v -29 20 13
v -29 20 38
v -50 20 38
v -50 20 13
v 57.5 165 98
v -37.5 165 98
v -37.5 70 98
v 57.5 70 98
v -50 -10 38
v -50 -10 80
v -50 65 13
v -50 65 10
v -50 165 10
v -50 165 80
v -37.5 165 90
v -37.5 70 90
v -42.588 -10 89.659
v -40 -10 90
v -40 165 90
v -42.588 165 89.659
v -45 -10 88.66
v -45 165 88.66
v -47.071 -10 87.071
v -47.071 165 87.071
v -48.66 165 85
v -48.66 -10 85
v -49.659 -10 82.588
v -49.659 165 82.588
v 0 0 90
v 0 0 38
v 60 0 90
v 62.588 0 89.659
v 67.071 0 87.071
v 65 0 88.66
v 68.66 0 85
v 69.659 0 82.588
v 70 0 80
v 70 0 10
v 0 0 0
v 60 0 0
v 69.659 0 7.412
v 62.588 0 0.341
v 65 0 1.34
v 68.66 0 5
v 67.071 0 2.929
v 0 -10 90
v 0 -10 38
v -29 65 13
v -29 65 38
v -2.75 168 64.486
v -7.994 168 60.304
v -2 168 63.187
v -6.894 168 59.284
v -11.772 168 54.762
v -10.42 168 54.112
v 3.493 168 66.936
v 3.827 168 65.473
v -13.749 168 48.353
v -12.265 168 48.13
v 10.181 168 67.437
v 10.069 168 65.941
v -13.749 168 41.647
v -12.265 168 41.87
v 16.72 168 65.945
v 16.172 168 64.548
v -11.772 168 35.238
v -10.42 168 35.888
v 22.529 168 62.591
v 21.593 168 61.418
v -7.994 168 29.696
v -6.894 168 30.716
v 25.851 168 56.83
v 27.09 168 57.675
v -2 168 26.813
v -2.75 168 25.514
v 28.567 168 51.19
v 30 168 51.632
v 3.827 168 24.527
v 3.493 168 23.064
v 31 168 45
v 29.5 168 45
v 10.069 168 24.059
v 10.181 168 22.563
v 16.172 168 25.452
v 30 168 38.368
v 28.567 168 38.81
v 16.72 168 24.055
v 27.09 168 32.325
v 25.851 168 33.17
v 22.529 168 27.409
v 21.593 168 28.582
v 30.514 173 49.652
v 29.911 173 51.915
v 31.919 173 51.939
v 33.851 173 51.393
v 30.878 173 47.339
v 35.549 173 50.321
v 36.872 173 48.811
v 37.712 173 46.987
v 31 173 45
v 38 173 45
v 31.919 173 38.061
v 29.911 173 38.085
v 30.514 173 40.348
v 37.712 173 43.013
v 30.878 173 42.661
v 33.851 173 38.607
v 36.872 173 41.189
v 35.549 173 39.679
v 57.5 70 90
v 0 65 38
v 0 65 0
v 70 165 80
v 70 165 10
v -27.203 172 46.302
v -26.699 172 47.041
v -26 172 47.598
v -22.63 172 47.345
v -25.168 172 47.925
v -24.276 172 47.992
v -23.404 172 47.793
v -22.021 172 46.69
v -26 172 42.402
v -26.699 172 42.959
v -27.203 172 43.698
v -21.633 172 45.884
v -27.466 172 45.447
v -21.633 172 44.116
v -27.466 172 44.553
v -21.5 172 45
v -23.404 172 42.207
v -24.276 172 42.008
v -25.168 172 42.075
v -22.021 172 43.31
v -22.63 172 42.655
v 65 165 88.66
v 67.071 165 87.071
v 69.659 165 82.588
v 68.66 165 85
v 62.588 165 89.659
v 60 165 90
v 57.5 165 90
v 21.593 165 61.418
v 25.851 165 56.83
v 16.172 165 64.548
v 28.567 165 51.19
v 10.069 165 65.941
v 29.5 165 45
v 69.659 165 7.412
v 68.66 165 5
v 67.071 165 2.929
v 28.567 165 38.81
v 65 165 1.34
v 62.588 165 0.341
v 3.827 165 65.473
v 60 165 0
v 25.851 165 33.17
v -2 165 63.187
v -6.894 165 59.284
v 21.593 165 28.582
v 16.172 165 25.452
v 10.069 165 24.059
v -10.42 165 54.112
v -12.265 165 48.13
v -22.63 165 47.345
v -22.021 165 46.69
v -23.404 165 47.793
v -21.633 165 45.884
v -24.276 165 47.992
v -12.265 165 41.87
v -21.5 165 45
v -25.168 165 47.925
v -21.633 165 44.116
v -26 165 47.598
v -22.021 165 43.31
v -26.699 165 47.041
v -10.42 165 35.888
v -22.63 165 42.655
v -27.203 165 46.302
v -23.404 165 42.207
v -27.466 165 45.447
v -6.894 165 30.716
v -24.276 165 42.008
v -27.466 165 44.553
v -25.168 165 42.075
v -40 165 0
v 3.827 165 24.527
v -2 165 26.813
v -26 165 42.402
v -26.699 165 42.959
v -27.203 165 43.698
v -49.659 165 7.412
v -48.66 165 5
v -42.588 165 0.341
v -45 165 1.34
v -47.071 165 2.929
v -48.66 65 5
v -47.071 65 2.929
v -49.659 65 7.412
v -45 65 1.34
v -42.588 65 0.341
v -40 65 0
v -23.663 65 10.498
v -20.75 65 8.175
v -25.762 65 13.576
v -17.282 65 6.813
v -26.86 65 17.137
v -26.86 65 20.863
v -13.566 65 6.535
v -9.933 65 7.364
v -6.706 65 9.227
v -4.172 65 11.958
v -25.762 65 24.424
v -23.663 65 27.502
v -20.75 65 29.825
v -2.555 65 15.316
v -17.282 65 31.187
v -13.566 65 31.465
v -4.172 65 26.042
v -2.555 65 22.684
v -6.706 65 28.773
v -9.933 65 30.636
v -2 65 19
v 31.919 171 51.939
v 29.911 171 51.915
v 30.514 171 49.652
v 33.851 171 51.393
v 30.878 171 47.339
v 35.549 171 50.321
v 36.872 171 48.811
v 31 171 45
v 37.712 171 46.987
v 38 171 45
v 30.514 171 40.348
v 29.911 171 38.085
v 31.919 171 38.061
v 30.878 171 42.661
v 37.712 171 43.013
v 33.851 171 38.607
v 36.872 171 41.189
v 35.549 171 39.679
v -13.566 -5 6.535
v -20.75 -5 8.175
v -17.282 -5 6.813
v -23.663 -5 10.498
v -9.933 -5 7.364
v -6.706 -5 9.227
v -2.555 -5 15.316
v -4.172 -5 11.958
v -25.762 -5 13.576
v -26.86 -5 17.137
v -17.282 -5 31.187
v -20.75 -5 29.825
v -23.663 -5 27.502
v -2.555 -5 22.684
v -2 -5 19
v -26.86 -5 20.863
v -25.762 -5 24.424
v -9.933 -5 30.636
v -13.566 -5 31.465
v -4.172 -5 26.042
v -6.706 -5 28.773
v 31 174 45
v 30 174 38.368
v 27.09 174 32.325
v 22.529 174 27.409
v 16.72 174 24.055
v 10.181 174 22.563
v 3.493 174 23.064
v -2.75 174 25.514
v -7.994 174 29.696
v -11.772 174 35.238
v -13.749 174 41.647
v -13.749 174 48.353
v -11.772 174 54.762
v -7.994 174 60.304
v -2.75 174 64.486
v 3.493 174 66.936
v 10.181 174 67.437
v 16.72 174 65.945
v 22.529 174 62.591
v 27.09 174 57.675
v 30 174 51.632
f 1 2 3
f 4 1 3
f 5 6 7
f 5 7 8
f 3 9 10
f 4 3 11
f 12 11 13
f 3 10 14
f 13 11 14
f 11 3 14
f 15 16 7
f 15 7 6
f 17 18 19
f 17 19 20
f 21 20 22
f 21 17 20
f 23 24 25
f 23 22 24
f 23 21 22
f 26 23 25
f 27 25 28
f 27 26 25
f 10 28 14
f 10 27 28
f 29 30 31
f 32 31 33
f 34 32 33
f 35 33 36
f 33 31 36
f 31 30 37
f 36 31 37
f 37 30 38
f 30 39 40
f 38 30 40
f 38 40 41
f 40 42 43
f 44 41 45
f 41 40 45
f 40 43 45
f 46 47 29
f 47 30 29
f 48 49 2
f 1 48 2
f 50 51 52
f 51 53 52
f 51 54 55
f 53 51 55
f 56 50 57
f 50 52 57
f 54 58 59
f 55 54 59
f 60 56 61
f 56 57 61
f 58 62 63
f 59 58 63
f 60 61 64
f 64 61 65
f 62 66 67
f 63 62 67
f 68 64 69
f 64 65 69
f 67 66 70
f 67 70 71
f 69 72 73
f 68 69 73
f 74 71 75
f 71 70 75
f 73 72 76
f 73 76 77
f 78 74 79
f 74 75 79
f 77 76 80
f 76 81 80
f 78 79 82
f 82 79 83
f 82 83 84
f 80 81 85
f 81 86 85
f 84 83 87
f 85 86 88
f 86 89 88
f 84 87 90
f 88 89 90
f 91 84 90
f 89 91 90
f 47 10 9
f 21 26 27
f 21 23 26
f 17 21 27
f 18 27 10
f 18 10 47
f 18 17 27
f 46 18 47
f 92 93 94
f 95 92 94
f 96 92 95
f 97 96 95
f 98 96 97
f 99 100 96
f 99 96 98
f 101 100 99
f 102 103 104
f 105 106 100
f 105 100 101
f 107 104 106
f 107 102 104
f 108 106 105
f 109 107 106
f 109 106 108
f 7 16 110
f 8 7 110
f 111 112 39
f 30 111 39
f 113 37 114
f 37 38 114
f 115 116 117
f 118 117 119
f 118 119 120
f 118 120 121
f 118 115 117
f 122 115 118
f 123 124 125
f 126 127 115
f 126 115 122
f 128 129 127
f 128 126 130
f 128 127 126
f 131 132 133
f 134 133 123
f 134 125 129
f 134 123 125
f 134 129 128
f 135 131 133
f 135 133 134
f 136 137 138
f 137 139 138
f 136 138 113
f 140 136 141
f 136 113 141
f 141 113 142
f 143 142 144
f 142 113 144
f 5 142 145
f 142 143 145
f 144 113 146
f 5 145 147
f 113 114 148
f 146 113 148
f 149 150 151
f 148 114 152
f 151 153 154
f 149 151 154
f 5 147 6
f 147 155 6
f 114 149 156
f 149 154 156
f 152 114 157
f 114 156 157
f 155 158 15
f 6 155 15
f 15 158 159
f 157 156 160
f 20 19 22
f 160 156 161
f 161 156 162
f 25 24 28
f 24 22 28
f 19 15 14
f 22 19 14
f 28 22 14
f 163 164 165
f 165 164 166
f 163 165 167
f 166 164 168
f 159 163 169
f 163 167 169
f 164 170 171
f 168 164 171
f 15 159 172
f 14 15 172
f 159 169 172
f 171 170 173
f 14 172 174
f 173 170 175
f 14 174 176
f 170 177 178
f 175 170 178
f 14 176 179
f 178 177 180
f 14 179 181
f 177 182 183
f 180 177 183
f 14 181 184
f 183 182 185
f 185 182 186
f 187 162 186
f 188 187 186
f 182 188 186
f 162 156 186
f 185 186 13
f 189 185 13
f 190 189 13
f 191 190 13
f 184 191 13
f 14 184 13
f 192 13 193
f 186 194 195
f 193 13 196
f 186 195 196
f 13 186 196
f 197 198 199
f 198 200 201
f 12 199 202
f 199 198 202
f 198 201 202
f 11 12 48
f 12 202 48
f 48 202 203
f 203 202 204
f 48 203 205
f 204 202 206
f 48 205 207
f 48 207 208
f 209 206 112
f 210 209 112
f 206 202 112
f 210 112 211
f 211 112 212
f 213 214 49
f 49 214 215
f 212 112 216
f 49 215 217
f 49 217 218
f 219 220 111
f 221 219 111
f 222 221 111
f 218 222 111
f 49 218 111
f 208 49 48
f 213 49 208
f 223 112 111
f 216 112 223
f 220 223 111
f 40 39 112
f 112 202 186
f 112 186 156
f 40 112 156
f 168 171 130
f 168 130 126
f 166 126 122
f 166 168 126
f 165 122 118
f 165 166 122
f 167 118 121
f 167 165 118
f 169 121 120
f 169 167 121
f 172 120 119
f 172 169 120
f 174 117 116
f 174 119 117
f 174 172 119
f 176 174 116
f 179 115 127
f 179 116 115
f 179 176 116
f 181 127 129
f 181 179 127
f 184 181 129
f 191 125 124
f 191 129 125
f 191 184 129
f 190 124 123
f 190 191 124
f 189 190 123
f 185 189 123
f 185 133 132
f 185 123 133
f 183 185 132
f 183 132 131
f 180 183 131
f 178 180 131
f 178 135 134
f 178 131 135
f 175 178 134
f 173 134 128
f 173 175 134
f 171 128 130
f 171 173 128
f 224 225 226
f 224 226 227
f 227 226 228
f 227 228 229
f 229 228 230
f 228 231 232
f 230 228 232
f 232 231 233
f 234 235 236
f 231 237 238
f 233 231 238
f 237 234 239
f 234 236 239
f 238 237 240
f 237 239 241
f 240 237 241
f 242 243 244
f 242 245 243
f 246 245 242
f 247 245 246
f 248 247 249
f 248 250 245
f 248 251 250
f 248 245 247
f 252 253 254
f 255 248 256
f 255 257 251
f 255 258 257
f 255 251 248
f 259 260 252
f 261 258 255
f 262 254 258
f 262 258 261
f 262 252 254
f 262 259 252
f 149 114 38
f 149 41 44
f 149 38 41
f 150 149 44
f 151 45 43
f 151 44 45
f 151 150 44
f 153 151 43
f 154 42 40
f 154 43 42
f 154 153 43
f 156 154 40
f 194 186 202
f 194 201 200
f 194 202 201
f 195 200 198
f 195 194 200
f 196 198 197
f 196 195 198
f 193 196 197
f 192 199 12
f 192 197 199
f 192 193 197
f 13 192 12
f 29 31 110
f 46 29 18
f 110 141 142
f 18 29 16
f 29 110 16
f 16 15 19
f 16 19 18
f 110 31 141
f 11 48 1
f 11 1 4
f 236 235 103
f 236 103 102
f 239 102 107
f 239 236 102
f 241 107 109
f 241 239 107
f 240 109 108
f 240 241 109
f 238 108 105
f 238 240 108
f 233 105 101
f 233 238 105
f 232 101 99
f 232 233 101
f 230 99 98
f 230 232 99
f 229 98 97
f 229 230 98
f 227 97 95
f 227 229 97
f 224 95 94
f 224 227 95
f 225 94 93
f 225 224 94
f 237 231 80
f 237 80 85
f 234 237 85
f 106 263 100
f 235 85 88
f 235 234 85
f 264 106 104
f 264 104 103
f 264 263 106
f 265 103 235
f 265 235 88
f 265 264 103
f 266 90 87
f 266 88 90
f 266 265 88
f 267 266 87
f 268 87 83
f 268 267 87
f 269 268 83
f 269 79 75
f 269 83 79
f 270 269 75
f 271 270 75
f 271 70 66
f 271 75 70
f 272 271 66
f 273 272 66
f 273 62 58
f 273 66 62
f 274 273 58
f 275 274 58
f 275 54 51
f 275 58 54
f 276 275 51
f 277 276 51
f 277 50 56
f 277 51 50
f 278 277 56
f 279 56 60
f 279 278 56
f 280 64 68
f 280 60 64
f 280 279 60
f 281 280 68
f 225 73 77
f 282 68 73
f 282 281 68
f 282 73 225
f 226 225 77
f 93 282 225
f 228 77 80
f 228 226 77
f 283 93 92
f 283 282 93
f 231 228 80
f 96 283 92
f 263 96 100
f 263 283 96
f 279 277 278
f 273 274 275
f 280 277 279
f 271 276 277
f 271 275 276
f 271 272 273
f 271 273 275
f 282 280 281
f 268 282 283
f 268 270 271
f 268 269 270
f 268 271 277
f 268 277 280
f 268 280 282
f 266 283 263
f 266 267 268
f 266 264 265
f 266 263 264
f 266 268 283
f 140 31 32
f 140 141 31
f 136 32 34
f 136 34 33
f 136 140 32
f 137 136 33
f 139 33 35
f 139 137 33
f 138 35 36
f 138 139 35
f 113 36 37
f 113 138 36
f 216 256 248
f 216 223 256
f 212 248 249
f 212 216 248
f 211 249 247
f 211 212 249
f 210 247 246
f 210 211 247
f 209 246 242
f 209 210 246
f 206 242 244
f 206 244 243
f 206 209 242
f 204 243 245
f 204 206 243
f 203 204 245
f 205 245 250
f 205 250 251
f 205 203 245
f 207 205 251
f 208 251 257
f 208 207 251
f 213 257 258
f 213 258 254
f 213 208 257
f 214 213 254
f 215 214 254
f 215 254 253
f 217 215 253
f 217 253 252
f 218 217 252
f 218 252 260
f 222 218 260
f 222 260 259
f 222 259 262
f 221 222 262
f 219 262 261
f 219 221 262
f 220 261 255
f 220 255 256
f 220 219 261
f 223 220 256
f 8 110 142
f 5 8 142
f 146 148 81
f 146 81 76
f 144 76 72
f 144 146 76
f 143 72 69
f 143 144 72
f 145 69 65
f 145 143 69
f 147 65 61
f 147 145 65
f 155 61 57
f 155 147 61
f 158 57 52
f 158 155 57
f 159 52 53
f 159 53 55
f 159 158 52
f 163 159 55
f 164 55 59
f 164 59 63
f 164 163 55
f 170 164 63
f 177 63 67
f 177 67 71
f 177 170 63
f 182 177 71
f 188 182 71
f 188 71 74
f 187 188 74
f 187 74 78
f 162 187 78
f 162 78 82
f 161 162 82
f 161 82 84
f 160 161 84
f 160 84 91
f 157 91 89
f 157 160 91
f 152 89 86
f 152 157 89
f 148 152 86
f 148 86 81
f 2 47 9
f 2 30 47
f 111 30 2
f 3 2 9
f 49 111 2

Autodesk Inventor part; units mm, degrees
sketch "Sketch2" plane through (0, 0, 0) normal (0, 0, 1) x (1, 0, 0)
  line L0 (0, 0) -> (70, 0)
  line L1 (70, 0) -> (70, 165)
  line L2 (70, 165) -> (0, 165)
  line L3 (0, 165) -> (0, 0)
  dimension "d0" = 165
  dimension "d1" = 70
extrude "Extrusion1" add sketch "Sketch2" along normal blind 90
sketch "Sketch6" plane through (0, 0, 0) normal (-1, 0, 0) x (0, 0, 1)
  line L0 (90, 0) -> (90, 165) projected
  line L1 (0, 0) -> (0, 165) projected
  line L2 (90, 165) -> (0, 165)
  line L3 (0, 165) -> (0, 65)
  line L4 (0, 65) -> (90, 65)
  line L5 (90, 65) -> (90, 165)
  dimension "d8" = 100
extrude "Extrusion3" add sketch "Sketch6" along normal blind 50
sketch "Sketch7" plane through (0, 65, 0) normal (0, -1, 0) x (1, 0, 0)
  line L0 (70, 90) -> (-50, 90) projected
  line L1 (0, 0) -> (0, 90) projected
  line L2 (-50, 90) -> (0, 90)
  line L3 (0, 90) -> (0, 38)
  line L4 (0, 38) -> (-50, 38)
  line L5 (-50, 38) -> (-50, 90)
  dimension "d11" = 52
extrude "Extrusion4" add sketch "Sketch7" along normal blind 75
sketch "Sketch8" plane through (0, 65, 38) normal (0, 0, -1) x (-1, 0, 0)
  line L0 (0, 0) -> (50, 0) projected
  line L1 (50, 0) -> (29, 0)
  line L2 (29, 0) -> (29, -45)
  line L3 (29, -45) -> (50, -45)
  line L4 (50, -45) -> (50, 0)
  point P0 (0, -65)
  point P1 (29, 0)
  dimension "d14" = 21
  dimension "d15" = 45
extrude "Extrusion5" add sketch "Sketch8" along normal blind 25
sketch "Sketch9" plane through (0, 0, 90) normal (0, 0, 1) x (1, 0, 0)
  line L0 (70, 165) -> (-50, 165) projected
  line L1 (-50, 165) -> (70, 165)
  line L2 (70, 165) -> (10, 165)
  line L3 (10, 70) -> (57.5, 70)
  line L4 (57.5, 70) -> (-37.5, 70)
  line L5 (-37.5, 70) -> (-37.5, 165)
  line L6 (57.5, 70) -> (57.5, 165)
  point P0 (0, 0)
  dimension "d20" = 95
  dimension "d21" = 95
extrude "Extrusion6" add sketch "Sketch9" along normal blind 8
ref_plane "Work Plane1" through (-48, 65, 2) normal (0, -1, 0) x (1, 0, 0)
sketch "Sketch10" plane through (-48, 65, 2) normal (0, -1, 0) x (1, 0, 0)
  line L0 (21, 34) -> (46, 34) projected
  line L1 (33.5, 34) -> (33.5, 0)
  line L2 (46, 0) -> (0, 0) projected
  circle A0 centre (33.5, 17) radius 12.5
  point P0 (48, -2)
extrude "Extrusion7" add sketch "Sketch10" along normal blind 70
ref_plane "Work Plane3" through (-48, 165, 5) normal (0, 1, 0) x (1, 0, 0)
sketch "Sketch11" plane through (-48, 165, 5) normal (0, 1, 0) x (1, 0, 0)
  line L0 (113, 0) -> (113, -80) projected
  line L1 (0, -80) -> (0, 0) projected
  circle A0 centre (56.5, -40) radius 21
  point P0 (48, 5)
  dimension "d29" = 42
extrude "Extrusion8" add sketch "Sketch11" along normal blind 6
ref_plane "Work Plane2" through (-48, 165, 5) normal (0, 1, 0) x (1, 0, 0)
sketch "Sketch12" plane through (-48, 165, 5) normal (0, 1, 0) x (1, 0, 0)
  circle A0 centre (56.5, -40) radius 21 projected
  line L0 (35.5, -40) -> (26.5, -40)
  circle A1 centre (23.5, -40) radius 3
  point P0 (48, 5)
  dimension "d32" = 9
extrude "Extrusion9" add sketch "Sketch12" along normal blind 7 contours A1
sketch "Sketch13" plane through (8.5, 171, 45) normal (0, 1, 0) x (1, 0, 0)
  circle A0 centre (0, 0) radius 22.5
  arc A1 (21.4111, -6.9148) -> (21.4111, 6.9148) centre (22.5, 0) ccw
  point P0 (-8.5, 45)
  dimension "d37" = 45
  dimension "d38" = 14
extrude "Extrusion10" add sketch "Sketch13" along normal mid plane 6 contours A0
extrude "Extrusion11" add sketch "Sketch13" along normal blind 2 contours A0 A1
fillet "Fillet3" radius 10 4 edges at (-50, 115, 0) (70, 82.5, 0) (70, 82.5, 90) (-50, 77.5, 90)
properties part number "windshield washer"
